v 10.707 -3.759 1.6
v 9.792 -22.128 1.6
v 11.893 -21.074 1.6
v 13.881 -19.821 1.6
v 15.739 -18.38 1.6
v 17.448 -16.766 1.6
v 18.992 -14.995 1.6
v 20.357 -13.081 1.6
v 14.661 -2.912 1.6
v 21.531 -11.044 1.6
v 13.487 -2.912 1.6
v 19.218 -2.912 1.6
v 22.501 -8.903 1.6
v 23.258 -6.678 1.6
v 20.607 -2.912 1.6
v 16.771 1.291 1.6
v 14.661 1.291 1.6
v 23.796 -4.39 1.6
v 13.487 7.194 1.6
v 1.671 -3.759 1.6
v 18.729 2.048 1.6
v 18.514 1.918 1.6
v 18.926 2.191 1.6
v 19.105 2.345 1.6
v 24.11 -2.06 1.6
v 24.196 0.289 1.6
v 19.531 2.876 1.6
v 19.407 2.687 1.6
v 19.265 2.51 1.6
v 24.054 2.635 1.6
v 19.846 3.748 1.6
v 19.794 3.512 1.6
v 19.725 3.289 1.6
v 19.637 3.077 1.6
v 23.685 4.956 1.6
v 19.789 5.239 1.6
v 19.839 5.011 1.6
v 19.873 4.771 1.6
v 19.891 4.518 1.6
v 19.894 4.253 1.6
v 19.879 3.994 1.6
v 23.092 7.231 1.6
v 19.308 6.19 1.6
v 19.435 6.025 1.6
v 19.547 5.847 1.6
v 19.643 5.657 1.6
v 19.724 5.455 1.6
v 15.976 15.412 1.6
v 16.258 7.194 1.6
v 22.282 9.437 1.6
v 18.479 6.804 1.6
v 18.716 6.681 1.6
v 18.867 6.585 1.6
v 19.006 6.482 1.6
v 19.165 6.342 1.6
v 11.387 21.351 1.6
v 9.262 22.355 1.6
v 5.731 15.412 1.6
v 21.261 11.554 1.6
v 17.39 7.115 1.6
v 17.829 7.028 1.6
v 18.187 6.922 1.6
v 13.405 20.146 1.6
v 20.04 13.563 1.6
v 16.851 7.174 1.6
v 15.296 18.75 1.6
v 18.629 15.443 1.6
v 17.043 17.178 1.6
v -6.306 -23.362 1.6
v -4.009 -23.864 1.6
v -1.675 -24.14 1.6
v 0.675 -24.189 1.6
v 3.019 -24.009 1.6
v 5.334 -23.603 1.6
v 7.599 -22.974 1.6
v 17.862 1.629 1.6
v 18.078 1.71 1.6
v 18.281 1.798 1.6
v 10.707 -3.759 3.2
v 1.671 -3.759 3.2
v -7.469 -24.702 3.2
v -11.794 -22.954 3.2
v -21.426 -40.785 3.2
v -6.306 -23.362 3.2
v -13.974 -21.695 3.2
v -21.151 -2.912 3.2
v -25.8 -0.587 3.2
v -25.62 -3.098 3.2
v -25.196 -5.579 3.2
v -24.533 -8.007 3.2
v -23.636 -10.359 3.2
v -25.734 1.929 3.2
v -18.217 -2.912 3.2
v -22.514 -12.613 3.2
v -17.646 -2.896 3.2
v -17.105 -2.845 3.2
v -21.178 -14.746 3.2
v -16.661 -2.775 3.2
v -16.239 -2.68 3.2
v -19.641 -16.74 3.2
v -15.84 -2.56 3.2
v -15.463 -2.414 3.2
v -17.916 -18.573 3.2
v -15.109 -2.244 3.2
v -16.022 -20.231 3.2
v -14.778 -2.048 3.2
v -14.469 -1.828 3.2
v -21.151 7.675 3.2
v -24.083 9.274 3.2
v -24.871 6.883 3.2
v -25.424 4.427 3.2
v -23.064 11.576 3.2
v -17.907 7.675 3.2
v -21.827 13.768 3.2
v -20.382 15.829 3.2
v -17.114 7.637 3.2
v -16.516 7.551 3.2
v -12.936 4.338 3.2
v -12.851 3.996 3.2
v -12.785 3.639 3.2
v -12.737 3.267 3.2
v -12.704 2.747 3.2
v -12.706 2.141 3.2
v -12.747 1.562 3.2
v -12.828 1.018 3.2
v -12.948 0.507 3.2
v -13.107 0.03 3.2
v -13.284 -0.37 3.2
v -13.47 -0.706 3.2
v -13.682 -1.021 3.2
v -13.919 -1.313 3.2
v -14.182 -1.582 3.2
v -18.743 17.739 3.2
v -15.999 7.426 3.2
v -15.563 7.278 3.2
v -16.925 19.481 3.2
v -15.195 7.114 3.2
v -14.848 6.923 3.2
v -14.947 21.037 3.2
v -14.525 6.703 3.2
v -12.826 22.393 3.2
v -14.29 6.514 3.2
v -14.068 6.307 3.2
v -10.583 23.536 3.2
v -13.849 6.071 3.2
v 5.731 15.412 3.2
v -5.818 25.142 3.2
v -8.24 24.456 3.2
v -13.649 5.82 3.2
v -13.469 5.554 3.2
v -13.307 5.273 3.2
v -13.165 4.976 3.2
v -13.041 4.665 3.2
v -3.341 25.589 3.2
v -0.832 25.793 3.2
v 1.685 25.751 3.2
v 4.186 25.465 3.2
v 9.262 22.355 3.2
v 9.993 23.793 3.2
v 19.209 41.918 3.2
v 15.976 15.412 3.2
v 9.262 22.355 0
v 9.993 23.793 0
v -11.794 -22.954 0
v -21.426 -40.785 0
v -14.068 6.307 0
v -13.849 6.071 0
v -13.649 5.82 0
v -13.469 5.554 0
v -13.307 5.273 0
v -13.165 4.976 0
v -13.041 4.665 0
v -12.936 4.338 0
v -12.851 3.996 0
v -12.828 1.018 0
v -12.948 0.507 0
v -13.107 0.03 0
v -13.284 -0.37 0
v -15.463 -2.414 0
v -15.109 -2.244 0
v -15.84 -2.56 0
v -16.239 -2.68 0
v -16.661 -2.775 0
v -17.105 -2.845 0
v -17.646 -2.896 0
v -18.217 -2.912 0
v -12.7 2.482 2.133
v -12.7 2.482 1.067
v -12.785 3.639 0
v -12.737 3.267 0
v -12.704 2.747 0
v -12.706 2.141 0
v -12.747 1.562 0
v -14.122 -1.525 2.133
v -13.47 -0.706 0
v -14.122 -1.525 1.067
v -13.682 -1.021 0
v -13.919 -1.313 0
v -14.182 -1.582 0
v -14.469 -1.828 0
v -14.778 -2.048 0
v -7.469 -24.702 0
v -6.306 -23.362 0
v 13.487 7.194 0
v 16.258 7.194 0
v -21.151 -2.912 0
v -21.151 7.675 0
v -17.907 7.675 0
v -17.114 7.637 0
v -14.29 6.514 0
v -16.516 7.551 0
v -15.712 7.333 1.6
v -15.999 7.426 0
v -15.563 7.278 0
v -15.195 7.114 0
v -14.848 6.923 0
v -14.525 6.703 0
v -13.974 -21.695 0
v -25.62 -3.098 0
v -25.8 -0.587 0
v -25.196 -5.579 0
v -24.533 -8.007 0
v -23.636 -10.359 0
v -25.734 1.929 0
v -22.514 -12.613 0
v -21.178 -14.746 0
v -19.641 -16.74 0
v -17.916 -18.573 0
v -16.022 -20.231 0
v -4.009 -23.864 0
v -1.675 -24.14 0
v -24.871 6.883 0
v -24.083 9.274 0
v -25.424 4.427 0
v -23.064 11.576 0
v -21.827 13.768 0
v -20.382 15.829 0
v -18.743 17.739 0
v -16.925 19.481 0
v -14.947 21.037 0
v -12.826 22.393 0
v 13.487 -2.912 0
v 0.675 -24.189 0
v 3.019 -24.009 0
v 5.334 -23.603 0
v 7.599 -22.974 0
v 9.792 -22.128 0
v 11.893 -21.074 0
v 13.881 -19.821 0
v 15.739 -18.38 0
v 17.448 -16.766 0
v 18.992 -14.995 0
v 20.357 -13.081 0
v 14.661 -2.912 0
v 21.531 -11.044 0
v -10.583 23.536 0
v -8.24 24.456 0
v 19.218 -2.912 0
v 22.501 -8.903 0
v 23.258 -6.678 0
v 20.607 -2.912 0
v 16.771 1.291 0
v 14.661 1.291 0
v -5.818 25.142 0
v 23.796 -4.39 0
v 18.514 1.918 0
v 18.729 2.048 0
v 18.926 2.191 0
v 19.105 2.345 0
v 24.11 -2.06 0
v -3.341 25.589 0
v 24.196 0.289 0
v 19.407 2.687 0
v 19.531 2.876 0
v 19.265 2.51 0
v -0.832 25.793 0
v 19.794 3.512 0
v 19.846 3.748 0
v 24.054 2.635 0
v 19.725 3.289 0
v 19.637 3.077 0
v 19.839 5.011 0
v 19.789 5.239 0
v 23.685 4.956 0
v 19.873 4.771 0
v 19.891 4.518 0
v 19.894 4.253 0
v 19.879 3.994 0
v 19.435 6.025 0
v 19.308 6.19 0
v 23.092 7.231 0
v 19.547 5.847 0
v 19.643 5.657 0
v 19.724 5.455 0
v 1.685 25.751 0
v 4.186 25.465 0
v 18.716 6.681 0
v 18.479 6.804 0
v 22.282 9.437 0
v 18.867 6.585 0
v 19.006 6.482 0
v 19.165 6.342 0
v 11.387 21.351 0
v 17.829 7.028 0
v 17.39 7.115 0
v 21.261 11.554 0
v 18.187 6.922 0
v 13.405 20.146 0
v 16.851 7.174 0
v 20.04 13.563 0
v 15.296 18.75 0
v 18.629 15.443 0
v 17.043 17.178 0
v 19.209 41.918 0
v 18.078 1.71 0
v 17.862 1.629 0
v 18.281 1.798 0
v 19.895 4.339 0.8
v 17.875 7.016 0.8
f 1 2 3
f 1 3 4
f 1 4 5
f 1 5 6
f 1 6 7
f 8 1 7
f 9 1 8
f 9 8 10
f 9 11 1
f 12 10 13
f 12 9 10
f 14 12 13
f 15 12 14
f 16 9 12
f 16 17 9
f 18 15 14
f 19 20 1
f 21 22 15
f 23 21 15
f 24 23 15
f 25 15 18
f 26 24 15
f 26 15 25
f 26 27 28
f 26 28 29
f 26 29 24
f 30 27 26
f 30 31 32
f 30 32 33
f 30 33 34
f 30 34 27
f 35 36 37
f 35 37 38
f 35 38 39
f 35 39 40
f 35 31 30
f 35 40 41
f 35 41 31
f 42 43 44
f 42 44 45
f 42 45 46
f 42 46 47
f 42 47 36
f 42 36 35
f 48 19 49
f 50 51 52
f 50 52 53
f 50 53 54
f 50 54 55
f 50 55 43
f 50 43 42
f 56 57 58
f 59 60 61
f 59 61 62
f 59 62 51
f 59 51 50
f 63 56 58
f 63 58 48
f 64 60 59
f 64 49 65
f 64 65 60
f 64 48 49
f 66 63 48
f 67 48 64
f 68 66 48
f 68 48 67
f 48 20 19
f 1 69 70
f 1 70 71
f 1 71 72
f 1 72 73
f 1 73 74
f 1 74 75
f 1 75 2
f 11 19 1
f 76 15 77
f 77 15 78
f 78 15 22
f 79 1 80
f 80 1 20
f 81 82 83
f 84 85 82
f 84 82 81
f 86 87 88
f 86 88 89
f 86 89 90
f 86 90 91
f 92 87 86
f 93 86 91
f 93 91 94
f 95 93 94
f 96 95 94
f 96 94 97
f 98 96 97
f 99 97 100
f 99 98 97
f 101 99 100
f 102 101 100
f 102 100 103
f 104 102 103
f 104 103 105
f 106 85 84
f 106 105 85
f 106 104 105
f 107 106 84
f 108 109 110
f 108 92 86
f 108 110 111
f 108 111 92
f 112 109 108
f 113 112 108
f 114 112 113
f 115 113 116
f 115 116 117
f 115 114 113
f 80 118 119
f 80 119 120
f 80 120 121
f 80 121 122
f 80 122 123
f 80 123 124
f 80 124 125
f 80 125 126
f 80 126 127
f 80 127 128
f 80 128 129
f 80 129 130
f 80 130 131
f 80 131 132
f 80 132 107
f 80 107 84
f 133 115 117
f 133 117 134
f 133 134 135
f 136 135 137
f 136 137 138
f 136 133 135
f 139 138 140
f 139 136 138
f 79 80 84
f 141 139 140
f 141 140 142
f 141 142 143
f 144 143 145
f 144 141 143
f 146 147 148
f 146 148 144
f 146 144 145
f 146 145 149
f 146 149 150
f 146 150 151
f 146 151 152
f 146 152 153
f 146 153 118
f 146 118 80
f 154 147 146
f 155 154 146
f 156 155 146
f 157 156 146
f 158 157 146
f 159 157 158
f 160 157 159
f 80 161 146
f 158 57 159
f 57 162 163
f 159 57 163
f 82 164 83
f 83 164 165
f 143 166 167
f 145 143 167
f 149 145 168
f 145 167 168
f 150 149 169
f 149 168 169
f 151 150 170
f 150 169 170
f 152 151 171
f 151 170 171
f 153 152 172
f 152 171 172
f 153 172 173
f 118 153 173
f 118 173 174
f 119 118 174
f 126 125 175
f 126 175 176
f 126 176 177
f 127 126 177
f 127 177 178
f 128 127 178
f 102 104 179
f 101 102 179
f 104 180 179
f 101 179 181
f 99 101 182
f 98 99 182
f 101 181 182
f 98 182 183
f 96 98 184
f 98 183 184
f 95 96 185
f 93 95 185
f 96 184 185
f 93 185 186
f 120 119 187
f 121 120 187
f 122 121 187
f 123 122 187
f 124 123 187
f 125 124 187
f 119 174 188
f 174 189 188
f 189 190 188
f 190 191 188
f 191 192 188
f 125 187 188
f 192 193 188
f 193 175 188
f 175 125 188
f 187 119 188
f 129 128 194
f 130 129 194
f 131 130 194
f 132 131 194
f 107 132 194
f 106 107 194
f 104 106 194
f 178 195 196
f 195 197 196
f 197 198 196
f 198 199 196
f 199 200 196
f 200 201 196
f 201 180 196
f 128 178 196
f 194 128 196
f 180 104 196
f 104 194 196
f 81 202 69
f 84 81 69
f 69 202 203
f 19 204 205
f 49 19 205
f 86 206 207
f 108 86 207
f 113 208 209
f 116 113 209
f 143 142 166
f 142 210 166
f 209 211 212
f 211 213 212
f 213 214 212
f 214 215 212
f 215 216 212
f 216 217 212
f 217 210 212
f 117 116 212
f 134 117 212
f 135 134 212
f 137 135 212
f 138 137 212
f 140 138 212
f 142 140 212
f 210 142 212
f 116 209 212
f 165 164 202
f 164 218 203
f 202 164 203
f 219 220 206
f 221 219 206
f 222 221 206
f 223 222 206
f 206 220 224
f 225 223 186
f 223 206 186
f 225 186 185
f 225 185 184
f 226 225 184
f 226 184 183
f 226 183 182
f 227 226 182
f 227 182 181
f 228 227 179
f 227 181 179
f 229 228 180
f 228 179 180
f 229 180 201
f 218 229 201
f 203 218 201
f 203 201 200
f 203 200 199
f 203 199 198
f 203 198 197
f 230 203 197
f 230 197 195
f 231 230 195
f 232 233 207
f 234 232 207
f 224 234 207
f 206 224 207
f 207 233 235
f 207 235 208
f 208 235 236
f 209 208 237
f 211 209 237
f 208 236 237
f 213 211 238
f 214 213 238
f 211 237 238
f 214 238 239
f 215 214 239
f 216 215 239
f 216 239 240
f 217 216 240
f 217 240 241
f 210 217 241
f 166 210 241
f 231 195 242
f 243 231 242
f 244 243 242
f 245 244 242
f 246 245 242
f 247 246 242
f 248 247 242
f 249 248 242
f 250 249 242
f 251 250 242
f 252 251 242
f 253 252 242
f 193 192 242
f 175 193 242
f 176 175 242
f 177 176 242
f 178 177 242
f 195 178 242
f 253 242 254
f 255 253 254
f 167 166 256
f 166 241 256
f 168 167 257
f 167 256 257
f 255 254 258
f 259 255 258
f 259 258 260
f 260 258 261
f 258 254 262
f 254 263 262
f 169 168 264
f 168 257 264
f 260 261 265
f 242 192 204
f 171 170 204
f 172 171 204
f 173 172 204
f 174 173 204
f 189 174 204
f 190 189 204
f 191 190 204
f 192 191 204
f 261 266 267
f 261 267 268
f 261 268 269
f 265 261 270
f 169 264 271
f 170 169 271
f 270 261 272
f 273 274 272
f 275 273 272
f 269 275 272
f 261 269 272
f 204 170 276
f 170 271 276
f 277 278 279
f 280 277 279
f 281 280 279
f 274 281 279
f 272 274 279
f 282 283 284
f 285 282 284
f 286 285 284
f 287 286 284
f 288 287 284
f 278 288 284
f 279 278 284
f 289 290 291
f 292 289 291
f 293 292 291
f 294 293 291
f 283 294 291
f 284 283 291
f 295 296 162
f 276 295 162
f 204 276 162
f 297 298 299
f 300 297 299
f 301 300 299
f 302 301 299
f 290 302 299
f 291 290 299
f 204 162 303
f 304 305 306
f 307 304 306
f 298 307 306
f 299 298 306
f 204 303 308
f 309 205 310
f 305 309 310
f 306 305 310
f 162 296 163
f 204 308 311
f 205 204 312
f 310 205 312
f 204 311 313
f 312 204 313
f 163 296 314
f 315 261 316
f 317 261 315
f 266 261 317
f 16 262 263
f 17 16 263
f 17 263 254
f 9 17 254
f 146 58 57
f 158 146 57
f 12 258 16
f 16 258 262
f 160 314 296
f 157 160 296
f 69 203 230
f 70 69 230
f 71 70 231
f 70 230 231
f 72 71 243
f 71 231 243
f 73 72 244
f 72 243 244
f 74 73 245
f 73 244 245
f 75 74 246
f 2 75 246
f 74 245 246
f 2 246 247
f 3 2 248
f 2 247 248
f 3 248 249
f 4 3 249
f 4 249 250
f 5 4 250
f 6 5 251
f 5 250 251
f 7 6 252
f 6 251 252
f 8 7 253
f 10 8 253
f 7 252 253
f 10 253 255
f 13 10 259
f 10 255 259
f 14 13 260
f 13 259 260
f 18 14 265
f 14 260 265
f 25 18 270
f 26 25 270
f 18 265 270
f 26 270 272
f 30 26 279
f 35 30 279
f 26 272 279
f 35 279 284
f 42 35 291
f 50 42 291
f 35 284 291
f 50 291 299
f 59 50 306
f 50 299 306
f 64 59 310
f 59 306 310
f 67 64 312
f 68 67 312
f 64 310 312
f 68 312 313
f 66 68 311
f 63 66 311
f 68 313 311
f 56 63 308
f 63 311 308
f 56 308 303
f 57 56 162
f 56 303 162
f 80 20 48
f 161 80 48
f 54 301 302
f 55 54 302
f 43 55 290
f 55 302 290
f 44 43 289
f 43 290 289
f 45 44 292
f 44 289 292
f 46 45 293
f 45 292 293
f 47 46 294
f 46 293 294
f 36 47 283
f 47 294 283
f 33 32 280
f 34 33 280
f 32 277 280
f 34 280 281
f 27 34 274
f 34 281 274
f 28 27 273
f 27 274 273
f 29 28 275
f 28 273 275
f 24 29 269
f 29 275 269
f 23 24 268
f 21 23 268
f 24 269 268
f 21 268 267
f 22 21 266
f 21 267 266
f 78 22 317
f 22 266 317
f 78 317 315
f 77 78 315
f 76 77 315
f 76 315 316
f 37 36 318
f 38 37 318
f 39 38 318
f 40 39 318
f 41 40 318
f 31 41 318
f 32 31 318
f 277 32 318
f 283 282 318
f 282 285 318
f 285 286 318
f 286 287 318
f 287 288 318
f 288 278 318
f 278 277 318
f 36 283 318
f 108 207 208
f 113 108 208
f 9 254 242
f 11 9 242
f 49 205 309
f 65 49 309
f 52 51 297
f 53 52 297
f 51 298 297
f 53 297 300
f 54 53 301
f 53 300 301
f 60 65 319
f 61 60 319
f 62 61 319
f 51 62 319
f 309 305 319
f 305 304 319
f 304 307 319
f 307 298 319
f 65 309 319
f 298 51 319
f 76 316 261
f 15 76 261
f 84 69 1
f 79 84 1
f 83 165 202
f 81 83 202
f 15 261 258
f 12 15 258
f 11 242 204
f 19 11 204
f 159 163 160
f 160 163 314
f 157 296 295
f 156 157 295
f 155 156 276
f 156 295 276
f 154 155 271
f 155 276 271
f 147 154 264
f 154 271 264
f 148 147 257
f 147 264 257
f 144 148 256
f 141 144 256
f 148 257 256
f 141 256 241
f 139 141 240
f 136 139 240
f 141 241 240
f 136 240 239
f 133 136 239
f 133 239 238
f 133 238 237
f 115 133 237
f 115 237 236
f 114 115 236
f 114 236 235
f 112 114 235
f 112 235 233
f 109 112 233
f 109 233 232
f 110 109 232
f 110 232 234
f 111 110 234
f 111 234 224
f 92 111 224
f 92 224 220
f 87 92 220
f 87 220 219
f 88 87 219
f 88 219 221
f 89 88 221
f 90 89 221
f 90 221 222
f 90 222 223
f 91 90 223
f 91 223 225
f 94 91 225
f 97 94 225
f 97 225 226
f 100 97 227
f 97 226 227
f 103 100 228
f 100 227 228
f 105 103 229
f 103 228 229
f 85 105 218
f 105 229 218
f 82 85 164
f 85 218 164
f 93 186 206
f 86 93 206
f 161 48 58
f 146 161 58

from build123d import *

# Parameters (mm, degrees)
F1_DEPTH = 3.2
F2_DEPTH = 1.6
F3_DEPTH = 2.5


# Not quite as in the source:
# - a feature names something its author has since deleted; it is built from what else it names


with BuildPart() as f1:
    # F0 (on Top) → F1 (new body)
    with BuildSketch(Plane.XY):
        with BuildLine():
            Line((-12.0286401361, 7.7058477327), (2.8731075212, 24.026809333))
            ThreePointArc((2.8731075212, 24.026809333), (-23.1446184854, 7.061795007), (-11.0294978873, -21.5381635686))
            Line((-11.0294978873, -21.5381635686), (-4.3697794008, -9.2094279826))
            Line((-4.3697794008, -9.2094279826), (-18.230907619, -9.2094279826))
            Line((-18.230907619, -9.2094279826), (-2.0674222615, 7.7058477327))
            Line((-2.0674222615, 7.7058477327), (-12.0286401361, 7.7058477327))
        make_face()
        with BuildLine():
            add(Edge.make_bspline(
                [(-14.0679626526, 6.3070743063), (-12.6996164354, 4.9387280892), (-12.6996164354, 2.4824249728)],
                knots=[0, 0, 0, 1, 1, 1], degree=2))
            add(Edge.make_bspline(
                [(-12.6996164354, 2.4824249728), (-12.6996164354, -0.138404107), (-14.1224184292, -1.5252884609)],
                knots=[0, 0, 0, 1, 1, 1], degree=2))
            add(Edge.make_bspline(
                [(-14.1224184292, -1.5252884609), (-15.545220423, -2.9121728148), (-18.2170293788, -2.9121728148)],
                knots=[0, 0, 0, 1, 1, 1], degree=2))
            Line((-18.2170293788, -2.9121728148), (-21.1506895159, -2.9121728148))
            Line((-21.1506895159, -2.9121728148), (-21.1506895159, 7.6754205235))
            Line((-21.1506895159, 7.6754205235), (-17.9065155886, 7.6754205235))
            add(Edge.make_bspline(
                [(-17.9065155886, 7.6754205235), (-15.4363088697, 7.6754205235), (-14.0679626526, 6.3070743063)],
                knots=[0, 0, 0, 1, 1, 1], degree=2))
        make_face(mode=Mode.SUBTRACT)
        with BuildLine():
            ThreePointArc((-11.0294978873, -21.5381635686), (-23.1446184854, 7.061795007), (2.8731075212, 24.026809333))
            Line((2.8731075212, 24.026809333), (4.1858882241, 25.464616759))
            ThreePointArc((4.1858882241, 25.464616759), (-24.5061657926, 8.0880285022), (-11.7940875977, -22.9536024329))
            Line((-11.7940875977, -22.9536024329), (-11.0294978873, -21.5381635686))
        make_face()
        Polygon((4.1858882241, 25.464616759), (2.8731075212, 24.026809333), (-12.0286401361, 7.7058477327), (-2.0674222615, 7.7058477327), (-18.230907619, -9.2094279826), (-4.3697794008, -9.2094279826), (-11.0294978873, -21.5381635686), (-11.7940875977, -22.9536024329), (-21.4260146022, -40.7846085727), (-7.468564605, -24.7020021385), (-6.3056047528, -23.3619704275), (10.7070716166, -3.7589499261), (1.6710584512, -3.7589499261), (15.9755367786, 15.4116954654), (5.7308066454, 15.4116954654), (9.2615315623, 22.3554545173), (9.9925901152, 23.7932030147), (19.2086462315, 41.9181135037), align=None)
    extrude(amount=F1_DEPTH)

    # F0 (on Top) → F2 (join)
    with BuildSketch(Plane.XY):
        with BuildLine():
            ThreePointArc((-6.3056047528, -23.3619704275), (22.9064425811, -7.7998206282), (9.2615315623, 22.3554545173))
            Line((9.2615315623, 22.3554545173), (5.7308066454, 15.4116954654))
            Line((5.7308066454, 15.4116954654), (15.9755367786, 15.4116954654))
            Line((15.9755367786, 15.4116954654), (1.6710584512, -3.7589499261))
            Line((1.6710584512, -3.7589499261), (10.7070716166, -3.7589499261))
            Line((10.7070716166, -3.7589499261), (-6.3056047528, -23.3619704275))
        make_face()
        with BuildLine():
            Line((16.7712777882, 1.29050713), (14.6610901855, 1.29050713))
            Line((14.6610901855, 1.29050713), (14.6610901855, -2.912172582))
            Line((14.6610901855, -2.912172582), (13.4865518028, -2.912172582))
            Line((13.4865518028, -2.912172582), (13.4865518028, 7.1941661569))
            Line((13.4865518028, 7.1941661569), (16.258108476, 7.1941661569))
            add(Edge.make_bspline(
                [(16.258108476, 7.1941661569), (18.1183472327, 7.1941661569), (19.0064398139, 6.4819225426)],
                knots=[0, 0, 0, 1, 1, 1], degree=2))
            add(Edge.make_bspline(
                [(19.0064398139, 6.4819225426), (19.8945323952, 5.7696789282), (19.8945323952, 4.3385558895)],
                knots=[0, 0, 0, 1, 1, 1], degree=2))
            add(Edge.make_bspline(
                [(19.8945323952, 4.3385558895), (19.8945323952, 2.3345412479), (17.8617625766, 1.6289334436)],
                knots=[0, 0, 0, 1, 1, 1], degree=2))
            Line((17.8617625766, 1.6289334436), (20.6067760095, -2.912172582))
            Line((20.6067760095, -2.912172582), (19.2176797679, -2.912172582))
            Line((19.2176797679, -2.912172582), (16.7712777882, 1.29050713))
        make_face(mode=Mode.SUBTRACT)
        with BuildLine():
            Line((-12.0286401361, 7.7058477327), (2.8731075212, 24.026809333))
            ThreePointArc((2.8731075212, 24.026809333), (-23.1446184854, 7.061795007), (-11.0294978873, -21.5381635686))
            Line((-11.0294978873, -21.5381635686), (-4.3697794008, -9.2094279826))
            Line((-4.3697794008, -9.2094279826), (-18.230907619, -9.2094279826))
            Line((-18.230907619, -9.2094279826), (-2.0674222615, 7.7058477327))
            Line((-2.0674222615, 7.7058477327), (-12.0286401361, 7.7058477327))
        make_face()
        with BuildLine():
            add(Edge.make_bspline(
                [(-14.0679626526, 6.3070743063), (-12.6996164354, 4.9387280892), (-12.6996164354, 2.4824249728)],
                knots=[0, 0, 0, 1, 1, 1], degree=2))
            add(Edge.make_bspline(
                [(-12.6996164354, 2.4824249728), (-12.6996164354, -0.138404107), (-14.1224184292, -1.5252884609)],
                knots=[0, 0, 0, 1, 1, 1], degree=2))
            add(Edge.make_bspline(
                [(-14.1224184292, -1.5252884609), (-15.545220423, -2.9121728148), (-18.2170293788, -2.9121728148)],
                knots=[0, 0, 0, 1, 1, 1], degree=2))
            Line((-18.2170293788, -2.9121728148), (-21.1506895159, -2.9121728148))
            Line((-21.1506895159, -2.9121728148), (-21.1506895159, 7.6754205235))
            Line((-21.1506895159, 7.6754205235), (-17.9065155886, 7.6754205235))
            add(Edge.make_bspline(
                [(-17.9065155886, 7.6754205235), (-15.4363088697, 7.6754205235), (-14.0679626526, 6.3070743063)],
                knots=[0, 0, 0, 1, 1, 1], degree=2))
        make_face(mode=Mode.SUBTRACT)
    extrude(amount=F2_DEPTH)

    # F0 (on Top) → F3 (join)
    with BuildSketch(Plane.XY):
        with BuildLine():
            ThreePointArc((-11.0294978873, -21.5381635686), (-23.1446184854, 7.061795007), (2.8731075212, 24.026809333))
            Line((2.8731075212, 24.026809333), (4.1858882241, 25.464616759))
            ThreePointArc((4.1858882241, 25.464616759), (-24.5061657926, 8.0880285022), (-11.7940875977, -22.9536024329))
            Line((-11.7940875977, -22.9536024329), (-11.0294978873, -21.5381635686))
        make_face()
    extrude(amount=F3_DEPTH)


solid = f1.part
